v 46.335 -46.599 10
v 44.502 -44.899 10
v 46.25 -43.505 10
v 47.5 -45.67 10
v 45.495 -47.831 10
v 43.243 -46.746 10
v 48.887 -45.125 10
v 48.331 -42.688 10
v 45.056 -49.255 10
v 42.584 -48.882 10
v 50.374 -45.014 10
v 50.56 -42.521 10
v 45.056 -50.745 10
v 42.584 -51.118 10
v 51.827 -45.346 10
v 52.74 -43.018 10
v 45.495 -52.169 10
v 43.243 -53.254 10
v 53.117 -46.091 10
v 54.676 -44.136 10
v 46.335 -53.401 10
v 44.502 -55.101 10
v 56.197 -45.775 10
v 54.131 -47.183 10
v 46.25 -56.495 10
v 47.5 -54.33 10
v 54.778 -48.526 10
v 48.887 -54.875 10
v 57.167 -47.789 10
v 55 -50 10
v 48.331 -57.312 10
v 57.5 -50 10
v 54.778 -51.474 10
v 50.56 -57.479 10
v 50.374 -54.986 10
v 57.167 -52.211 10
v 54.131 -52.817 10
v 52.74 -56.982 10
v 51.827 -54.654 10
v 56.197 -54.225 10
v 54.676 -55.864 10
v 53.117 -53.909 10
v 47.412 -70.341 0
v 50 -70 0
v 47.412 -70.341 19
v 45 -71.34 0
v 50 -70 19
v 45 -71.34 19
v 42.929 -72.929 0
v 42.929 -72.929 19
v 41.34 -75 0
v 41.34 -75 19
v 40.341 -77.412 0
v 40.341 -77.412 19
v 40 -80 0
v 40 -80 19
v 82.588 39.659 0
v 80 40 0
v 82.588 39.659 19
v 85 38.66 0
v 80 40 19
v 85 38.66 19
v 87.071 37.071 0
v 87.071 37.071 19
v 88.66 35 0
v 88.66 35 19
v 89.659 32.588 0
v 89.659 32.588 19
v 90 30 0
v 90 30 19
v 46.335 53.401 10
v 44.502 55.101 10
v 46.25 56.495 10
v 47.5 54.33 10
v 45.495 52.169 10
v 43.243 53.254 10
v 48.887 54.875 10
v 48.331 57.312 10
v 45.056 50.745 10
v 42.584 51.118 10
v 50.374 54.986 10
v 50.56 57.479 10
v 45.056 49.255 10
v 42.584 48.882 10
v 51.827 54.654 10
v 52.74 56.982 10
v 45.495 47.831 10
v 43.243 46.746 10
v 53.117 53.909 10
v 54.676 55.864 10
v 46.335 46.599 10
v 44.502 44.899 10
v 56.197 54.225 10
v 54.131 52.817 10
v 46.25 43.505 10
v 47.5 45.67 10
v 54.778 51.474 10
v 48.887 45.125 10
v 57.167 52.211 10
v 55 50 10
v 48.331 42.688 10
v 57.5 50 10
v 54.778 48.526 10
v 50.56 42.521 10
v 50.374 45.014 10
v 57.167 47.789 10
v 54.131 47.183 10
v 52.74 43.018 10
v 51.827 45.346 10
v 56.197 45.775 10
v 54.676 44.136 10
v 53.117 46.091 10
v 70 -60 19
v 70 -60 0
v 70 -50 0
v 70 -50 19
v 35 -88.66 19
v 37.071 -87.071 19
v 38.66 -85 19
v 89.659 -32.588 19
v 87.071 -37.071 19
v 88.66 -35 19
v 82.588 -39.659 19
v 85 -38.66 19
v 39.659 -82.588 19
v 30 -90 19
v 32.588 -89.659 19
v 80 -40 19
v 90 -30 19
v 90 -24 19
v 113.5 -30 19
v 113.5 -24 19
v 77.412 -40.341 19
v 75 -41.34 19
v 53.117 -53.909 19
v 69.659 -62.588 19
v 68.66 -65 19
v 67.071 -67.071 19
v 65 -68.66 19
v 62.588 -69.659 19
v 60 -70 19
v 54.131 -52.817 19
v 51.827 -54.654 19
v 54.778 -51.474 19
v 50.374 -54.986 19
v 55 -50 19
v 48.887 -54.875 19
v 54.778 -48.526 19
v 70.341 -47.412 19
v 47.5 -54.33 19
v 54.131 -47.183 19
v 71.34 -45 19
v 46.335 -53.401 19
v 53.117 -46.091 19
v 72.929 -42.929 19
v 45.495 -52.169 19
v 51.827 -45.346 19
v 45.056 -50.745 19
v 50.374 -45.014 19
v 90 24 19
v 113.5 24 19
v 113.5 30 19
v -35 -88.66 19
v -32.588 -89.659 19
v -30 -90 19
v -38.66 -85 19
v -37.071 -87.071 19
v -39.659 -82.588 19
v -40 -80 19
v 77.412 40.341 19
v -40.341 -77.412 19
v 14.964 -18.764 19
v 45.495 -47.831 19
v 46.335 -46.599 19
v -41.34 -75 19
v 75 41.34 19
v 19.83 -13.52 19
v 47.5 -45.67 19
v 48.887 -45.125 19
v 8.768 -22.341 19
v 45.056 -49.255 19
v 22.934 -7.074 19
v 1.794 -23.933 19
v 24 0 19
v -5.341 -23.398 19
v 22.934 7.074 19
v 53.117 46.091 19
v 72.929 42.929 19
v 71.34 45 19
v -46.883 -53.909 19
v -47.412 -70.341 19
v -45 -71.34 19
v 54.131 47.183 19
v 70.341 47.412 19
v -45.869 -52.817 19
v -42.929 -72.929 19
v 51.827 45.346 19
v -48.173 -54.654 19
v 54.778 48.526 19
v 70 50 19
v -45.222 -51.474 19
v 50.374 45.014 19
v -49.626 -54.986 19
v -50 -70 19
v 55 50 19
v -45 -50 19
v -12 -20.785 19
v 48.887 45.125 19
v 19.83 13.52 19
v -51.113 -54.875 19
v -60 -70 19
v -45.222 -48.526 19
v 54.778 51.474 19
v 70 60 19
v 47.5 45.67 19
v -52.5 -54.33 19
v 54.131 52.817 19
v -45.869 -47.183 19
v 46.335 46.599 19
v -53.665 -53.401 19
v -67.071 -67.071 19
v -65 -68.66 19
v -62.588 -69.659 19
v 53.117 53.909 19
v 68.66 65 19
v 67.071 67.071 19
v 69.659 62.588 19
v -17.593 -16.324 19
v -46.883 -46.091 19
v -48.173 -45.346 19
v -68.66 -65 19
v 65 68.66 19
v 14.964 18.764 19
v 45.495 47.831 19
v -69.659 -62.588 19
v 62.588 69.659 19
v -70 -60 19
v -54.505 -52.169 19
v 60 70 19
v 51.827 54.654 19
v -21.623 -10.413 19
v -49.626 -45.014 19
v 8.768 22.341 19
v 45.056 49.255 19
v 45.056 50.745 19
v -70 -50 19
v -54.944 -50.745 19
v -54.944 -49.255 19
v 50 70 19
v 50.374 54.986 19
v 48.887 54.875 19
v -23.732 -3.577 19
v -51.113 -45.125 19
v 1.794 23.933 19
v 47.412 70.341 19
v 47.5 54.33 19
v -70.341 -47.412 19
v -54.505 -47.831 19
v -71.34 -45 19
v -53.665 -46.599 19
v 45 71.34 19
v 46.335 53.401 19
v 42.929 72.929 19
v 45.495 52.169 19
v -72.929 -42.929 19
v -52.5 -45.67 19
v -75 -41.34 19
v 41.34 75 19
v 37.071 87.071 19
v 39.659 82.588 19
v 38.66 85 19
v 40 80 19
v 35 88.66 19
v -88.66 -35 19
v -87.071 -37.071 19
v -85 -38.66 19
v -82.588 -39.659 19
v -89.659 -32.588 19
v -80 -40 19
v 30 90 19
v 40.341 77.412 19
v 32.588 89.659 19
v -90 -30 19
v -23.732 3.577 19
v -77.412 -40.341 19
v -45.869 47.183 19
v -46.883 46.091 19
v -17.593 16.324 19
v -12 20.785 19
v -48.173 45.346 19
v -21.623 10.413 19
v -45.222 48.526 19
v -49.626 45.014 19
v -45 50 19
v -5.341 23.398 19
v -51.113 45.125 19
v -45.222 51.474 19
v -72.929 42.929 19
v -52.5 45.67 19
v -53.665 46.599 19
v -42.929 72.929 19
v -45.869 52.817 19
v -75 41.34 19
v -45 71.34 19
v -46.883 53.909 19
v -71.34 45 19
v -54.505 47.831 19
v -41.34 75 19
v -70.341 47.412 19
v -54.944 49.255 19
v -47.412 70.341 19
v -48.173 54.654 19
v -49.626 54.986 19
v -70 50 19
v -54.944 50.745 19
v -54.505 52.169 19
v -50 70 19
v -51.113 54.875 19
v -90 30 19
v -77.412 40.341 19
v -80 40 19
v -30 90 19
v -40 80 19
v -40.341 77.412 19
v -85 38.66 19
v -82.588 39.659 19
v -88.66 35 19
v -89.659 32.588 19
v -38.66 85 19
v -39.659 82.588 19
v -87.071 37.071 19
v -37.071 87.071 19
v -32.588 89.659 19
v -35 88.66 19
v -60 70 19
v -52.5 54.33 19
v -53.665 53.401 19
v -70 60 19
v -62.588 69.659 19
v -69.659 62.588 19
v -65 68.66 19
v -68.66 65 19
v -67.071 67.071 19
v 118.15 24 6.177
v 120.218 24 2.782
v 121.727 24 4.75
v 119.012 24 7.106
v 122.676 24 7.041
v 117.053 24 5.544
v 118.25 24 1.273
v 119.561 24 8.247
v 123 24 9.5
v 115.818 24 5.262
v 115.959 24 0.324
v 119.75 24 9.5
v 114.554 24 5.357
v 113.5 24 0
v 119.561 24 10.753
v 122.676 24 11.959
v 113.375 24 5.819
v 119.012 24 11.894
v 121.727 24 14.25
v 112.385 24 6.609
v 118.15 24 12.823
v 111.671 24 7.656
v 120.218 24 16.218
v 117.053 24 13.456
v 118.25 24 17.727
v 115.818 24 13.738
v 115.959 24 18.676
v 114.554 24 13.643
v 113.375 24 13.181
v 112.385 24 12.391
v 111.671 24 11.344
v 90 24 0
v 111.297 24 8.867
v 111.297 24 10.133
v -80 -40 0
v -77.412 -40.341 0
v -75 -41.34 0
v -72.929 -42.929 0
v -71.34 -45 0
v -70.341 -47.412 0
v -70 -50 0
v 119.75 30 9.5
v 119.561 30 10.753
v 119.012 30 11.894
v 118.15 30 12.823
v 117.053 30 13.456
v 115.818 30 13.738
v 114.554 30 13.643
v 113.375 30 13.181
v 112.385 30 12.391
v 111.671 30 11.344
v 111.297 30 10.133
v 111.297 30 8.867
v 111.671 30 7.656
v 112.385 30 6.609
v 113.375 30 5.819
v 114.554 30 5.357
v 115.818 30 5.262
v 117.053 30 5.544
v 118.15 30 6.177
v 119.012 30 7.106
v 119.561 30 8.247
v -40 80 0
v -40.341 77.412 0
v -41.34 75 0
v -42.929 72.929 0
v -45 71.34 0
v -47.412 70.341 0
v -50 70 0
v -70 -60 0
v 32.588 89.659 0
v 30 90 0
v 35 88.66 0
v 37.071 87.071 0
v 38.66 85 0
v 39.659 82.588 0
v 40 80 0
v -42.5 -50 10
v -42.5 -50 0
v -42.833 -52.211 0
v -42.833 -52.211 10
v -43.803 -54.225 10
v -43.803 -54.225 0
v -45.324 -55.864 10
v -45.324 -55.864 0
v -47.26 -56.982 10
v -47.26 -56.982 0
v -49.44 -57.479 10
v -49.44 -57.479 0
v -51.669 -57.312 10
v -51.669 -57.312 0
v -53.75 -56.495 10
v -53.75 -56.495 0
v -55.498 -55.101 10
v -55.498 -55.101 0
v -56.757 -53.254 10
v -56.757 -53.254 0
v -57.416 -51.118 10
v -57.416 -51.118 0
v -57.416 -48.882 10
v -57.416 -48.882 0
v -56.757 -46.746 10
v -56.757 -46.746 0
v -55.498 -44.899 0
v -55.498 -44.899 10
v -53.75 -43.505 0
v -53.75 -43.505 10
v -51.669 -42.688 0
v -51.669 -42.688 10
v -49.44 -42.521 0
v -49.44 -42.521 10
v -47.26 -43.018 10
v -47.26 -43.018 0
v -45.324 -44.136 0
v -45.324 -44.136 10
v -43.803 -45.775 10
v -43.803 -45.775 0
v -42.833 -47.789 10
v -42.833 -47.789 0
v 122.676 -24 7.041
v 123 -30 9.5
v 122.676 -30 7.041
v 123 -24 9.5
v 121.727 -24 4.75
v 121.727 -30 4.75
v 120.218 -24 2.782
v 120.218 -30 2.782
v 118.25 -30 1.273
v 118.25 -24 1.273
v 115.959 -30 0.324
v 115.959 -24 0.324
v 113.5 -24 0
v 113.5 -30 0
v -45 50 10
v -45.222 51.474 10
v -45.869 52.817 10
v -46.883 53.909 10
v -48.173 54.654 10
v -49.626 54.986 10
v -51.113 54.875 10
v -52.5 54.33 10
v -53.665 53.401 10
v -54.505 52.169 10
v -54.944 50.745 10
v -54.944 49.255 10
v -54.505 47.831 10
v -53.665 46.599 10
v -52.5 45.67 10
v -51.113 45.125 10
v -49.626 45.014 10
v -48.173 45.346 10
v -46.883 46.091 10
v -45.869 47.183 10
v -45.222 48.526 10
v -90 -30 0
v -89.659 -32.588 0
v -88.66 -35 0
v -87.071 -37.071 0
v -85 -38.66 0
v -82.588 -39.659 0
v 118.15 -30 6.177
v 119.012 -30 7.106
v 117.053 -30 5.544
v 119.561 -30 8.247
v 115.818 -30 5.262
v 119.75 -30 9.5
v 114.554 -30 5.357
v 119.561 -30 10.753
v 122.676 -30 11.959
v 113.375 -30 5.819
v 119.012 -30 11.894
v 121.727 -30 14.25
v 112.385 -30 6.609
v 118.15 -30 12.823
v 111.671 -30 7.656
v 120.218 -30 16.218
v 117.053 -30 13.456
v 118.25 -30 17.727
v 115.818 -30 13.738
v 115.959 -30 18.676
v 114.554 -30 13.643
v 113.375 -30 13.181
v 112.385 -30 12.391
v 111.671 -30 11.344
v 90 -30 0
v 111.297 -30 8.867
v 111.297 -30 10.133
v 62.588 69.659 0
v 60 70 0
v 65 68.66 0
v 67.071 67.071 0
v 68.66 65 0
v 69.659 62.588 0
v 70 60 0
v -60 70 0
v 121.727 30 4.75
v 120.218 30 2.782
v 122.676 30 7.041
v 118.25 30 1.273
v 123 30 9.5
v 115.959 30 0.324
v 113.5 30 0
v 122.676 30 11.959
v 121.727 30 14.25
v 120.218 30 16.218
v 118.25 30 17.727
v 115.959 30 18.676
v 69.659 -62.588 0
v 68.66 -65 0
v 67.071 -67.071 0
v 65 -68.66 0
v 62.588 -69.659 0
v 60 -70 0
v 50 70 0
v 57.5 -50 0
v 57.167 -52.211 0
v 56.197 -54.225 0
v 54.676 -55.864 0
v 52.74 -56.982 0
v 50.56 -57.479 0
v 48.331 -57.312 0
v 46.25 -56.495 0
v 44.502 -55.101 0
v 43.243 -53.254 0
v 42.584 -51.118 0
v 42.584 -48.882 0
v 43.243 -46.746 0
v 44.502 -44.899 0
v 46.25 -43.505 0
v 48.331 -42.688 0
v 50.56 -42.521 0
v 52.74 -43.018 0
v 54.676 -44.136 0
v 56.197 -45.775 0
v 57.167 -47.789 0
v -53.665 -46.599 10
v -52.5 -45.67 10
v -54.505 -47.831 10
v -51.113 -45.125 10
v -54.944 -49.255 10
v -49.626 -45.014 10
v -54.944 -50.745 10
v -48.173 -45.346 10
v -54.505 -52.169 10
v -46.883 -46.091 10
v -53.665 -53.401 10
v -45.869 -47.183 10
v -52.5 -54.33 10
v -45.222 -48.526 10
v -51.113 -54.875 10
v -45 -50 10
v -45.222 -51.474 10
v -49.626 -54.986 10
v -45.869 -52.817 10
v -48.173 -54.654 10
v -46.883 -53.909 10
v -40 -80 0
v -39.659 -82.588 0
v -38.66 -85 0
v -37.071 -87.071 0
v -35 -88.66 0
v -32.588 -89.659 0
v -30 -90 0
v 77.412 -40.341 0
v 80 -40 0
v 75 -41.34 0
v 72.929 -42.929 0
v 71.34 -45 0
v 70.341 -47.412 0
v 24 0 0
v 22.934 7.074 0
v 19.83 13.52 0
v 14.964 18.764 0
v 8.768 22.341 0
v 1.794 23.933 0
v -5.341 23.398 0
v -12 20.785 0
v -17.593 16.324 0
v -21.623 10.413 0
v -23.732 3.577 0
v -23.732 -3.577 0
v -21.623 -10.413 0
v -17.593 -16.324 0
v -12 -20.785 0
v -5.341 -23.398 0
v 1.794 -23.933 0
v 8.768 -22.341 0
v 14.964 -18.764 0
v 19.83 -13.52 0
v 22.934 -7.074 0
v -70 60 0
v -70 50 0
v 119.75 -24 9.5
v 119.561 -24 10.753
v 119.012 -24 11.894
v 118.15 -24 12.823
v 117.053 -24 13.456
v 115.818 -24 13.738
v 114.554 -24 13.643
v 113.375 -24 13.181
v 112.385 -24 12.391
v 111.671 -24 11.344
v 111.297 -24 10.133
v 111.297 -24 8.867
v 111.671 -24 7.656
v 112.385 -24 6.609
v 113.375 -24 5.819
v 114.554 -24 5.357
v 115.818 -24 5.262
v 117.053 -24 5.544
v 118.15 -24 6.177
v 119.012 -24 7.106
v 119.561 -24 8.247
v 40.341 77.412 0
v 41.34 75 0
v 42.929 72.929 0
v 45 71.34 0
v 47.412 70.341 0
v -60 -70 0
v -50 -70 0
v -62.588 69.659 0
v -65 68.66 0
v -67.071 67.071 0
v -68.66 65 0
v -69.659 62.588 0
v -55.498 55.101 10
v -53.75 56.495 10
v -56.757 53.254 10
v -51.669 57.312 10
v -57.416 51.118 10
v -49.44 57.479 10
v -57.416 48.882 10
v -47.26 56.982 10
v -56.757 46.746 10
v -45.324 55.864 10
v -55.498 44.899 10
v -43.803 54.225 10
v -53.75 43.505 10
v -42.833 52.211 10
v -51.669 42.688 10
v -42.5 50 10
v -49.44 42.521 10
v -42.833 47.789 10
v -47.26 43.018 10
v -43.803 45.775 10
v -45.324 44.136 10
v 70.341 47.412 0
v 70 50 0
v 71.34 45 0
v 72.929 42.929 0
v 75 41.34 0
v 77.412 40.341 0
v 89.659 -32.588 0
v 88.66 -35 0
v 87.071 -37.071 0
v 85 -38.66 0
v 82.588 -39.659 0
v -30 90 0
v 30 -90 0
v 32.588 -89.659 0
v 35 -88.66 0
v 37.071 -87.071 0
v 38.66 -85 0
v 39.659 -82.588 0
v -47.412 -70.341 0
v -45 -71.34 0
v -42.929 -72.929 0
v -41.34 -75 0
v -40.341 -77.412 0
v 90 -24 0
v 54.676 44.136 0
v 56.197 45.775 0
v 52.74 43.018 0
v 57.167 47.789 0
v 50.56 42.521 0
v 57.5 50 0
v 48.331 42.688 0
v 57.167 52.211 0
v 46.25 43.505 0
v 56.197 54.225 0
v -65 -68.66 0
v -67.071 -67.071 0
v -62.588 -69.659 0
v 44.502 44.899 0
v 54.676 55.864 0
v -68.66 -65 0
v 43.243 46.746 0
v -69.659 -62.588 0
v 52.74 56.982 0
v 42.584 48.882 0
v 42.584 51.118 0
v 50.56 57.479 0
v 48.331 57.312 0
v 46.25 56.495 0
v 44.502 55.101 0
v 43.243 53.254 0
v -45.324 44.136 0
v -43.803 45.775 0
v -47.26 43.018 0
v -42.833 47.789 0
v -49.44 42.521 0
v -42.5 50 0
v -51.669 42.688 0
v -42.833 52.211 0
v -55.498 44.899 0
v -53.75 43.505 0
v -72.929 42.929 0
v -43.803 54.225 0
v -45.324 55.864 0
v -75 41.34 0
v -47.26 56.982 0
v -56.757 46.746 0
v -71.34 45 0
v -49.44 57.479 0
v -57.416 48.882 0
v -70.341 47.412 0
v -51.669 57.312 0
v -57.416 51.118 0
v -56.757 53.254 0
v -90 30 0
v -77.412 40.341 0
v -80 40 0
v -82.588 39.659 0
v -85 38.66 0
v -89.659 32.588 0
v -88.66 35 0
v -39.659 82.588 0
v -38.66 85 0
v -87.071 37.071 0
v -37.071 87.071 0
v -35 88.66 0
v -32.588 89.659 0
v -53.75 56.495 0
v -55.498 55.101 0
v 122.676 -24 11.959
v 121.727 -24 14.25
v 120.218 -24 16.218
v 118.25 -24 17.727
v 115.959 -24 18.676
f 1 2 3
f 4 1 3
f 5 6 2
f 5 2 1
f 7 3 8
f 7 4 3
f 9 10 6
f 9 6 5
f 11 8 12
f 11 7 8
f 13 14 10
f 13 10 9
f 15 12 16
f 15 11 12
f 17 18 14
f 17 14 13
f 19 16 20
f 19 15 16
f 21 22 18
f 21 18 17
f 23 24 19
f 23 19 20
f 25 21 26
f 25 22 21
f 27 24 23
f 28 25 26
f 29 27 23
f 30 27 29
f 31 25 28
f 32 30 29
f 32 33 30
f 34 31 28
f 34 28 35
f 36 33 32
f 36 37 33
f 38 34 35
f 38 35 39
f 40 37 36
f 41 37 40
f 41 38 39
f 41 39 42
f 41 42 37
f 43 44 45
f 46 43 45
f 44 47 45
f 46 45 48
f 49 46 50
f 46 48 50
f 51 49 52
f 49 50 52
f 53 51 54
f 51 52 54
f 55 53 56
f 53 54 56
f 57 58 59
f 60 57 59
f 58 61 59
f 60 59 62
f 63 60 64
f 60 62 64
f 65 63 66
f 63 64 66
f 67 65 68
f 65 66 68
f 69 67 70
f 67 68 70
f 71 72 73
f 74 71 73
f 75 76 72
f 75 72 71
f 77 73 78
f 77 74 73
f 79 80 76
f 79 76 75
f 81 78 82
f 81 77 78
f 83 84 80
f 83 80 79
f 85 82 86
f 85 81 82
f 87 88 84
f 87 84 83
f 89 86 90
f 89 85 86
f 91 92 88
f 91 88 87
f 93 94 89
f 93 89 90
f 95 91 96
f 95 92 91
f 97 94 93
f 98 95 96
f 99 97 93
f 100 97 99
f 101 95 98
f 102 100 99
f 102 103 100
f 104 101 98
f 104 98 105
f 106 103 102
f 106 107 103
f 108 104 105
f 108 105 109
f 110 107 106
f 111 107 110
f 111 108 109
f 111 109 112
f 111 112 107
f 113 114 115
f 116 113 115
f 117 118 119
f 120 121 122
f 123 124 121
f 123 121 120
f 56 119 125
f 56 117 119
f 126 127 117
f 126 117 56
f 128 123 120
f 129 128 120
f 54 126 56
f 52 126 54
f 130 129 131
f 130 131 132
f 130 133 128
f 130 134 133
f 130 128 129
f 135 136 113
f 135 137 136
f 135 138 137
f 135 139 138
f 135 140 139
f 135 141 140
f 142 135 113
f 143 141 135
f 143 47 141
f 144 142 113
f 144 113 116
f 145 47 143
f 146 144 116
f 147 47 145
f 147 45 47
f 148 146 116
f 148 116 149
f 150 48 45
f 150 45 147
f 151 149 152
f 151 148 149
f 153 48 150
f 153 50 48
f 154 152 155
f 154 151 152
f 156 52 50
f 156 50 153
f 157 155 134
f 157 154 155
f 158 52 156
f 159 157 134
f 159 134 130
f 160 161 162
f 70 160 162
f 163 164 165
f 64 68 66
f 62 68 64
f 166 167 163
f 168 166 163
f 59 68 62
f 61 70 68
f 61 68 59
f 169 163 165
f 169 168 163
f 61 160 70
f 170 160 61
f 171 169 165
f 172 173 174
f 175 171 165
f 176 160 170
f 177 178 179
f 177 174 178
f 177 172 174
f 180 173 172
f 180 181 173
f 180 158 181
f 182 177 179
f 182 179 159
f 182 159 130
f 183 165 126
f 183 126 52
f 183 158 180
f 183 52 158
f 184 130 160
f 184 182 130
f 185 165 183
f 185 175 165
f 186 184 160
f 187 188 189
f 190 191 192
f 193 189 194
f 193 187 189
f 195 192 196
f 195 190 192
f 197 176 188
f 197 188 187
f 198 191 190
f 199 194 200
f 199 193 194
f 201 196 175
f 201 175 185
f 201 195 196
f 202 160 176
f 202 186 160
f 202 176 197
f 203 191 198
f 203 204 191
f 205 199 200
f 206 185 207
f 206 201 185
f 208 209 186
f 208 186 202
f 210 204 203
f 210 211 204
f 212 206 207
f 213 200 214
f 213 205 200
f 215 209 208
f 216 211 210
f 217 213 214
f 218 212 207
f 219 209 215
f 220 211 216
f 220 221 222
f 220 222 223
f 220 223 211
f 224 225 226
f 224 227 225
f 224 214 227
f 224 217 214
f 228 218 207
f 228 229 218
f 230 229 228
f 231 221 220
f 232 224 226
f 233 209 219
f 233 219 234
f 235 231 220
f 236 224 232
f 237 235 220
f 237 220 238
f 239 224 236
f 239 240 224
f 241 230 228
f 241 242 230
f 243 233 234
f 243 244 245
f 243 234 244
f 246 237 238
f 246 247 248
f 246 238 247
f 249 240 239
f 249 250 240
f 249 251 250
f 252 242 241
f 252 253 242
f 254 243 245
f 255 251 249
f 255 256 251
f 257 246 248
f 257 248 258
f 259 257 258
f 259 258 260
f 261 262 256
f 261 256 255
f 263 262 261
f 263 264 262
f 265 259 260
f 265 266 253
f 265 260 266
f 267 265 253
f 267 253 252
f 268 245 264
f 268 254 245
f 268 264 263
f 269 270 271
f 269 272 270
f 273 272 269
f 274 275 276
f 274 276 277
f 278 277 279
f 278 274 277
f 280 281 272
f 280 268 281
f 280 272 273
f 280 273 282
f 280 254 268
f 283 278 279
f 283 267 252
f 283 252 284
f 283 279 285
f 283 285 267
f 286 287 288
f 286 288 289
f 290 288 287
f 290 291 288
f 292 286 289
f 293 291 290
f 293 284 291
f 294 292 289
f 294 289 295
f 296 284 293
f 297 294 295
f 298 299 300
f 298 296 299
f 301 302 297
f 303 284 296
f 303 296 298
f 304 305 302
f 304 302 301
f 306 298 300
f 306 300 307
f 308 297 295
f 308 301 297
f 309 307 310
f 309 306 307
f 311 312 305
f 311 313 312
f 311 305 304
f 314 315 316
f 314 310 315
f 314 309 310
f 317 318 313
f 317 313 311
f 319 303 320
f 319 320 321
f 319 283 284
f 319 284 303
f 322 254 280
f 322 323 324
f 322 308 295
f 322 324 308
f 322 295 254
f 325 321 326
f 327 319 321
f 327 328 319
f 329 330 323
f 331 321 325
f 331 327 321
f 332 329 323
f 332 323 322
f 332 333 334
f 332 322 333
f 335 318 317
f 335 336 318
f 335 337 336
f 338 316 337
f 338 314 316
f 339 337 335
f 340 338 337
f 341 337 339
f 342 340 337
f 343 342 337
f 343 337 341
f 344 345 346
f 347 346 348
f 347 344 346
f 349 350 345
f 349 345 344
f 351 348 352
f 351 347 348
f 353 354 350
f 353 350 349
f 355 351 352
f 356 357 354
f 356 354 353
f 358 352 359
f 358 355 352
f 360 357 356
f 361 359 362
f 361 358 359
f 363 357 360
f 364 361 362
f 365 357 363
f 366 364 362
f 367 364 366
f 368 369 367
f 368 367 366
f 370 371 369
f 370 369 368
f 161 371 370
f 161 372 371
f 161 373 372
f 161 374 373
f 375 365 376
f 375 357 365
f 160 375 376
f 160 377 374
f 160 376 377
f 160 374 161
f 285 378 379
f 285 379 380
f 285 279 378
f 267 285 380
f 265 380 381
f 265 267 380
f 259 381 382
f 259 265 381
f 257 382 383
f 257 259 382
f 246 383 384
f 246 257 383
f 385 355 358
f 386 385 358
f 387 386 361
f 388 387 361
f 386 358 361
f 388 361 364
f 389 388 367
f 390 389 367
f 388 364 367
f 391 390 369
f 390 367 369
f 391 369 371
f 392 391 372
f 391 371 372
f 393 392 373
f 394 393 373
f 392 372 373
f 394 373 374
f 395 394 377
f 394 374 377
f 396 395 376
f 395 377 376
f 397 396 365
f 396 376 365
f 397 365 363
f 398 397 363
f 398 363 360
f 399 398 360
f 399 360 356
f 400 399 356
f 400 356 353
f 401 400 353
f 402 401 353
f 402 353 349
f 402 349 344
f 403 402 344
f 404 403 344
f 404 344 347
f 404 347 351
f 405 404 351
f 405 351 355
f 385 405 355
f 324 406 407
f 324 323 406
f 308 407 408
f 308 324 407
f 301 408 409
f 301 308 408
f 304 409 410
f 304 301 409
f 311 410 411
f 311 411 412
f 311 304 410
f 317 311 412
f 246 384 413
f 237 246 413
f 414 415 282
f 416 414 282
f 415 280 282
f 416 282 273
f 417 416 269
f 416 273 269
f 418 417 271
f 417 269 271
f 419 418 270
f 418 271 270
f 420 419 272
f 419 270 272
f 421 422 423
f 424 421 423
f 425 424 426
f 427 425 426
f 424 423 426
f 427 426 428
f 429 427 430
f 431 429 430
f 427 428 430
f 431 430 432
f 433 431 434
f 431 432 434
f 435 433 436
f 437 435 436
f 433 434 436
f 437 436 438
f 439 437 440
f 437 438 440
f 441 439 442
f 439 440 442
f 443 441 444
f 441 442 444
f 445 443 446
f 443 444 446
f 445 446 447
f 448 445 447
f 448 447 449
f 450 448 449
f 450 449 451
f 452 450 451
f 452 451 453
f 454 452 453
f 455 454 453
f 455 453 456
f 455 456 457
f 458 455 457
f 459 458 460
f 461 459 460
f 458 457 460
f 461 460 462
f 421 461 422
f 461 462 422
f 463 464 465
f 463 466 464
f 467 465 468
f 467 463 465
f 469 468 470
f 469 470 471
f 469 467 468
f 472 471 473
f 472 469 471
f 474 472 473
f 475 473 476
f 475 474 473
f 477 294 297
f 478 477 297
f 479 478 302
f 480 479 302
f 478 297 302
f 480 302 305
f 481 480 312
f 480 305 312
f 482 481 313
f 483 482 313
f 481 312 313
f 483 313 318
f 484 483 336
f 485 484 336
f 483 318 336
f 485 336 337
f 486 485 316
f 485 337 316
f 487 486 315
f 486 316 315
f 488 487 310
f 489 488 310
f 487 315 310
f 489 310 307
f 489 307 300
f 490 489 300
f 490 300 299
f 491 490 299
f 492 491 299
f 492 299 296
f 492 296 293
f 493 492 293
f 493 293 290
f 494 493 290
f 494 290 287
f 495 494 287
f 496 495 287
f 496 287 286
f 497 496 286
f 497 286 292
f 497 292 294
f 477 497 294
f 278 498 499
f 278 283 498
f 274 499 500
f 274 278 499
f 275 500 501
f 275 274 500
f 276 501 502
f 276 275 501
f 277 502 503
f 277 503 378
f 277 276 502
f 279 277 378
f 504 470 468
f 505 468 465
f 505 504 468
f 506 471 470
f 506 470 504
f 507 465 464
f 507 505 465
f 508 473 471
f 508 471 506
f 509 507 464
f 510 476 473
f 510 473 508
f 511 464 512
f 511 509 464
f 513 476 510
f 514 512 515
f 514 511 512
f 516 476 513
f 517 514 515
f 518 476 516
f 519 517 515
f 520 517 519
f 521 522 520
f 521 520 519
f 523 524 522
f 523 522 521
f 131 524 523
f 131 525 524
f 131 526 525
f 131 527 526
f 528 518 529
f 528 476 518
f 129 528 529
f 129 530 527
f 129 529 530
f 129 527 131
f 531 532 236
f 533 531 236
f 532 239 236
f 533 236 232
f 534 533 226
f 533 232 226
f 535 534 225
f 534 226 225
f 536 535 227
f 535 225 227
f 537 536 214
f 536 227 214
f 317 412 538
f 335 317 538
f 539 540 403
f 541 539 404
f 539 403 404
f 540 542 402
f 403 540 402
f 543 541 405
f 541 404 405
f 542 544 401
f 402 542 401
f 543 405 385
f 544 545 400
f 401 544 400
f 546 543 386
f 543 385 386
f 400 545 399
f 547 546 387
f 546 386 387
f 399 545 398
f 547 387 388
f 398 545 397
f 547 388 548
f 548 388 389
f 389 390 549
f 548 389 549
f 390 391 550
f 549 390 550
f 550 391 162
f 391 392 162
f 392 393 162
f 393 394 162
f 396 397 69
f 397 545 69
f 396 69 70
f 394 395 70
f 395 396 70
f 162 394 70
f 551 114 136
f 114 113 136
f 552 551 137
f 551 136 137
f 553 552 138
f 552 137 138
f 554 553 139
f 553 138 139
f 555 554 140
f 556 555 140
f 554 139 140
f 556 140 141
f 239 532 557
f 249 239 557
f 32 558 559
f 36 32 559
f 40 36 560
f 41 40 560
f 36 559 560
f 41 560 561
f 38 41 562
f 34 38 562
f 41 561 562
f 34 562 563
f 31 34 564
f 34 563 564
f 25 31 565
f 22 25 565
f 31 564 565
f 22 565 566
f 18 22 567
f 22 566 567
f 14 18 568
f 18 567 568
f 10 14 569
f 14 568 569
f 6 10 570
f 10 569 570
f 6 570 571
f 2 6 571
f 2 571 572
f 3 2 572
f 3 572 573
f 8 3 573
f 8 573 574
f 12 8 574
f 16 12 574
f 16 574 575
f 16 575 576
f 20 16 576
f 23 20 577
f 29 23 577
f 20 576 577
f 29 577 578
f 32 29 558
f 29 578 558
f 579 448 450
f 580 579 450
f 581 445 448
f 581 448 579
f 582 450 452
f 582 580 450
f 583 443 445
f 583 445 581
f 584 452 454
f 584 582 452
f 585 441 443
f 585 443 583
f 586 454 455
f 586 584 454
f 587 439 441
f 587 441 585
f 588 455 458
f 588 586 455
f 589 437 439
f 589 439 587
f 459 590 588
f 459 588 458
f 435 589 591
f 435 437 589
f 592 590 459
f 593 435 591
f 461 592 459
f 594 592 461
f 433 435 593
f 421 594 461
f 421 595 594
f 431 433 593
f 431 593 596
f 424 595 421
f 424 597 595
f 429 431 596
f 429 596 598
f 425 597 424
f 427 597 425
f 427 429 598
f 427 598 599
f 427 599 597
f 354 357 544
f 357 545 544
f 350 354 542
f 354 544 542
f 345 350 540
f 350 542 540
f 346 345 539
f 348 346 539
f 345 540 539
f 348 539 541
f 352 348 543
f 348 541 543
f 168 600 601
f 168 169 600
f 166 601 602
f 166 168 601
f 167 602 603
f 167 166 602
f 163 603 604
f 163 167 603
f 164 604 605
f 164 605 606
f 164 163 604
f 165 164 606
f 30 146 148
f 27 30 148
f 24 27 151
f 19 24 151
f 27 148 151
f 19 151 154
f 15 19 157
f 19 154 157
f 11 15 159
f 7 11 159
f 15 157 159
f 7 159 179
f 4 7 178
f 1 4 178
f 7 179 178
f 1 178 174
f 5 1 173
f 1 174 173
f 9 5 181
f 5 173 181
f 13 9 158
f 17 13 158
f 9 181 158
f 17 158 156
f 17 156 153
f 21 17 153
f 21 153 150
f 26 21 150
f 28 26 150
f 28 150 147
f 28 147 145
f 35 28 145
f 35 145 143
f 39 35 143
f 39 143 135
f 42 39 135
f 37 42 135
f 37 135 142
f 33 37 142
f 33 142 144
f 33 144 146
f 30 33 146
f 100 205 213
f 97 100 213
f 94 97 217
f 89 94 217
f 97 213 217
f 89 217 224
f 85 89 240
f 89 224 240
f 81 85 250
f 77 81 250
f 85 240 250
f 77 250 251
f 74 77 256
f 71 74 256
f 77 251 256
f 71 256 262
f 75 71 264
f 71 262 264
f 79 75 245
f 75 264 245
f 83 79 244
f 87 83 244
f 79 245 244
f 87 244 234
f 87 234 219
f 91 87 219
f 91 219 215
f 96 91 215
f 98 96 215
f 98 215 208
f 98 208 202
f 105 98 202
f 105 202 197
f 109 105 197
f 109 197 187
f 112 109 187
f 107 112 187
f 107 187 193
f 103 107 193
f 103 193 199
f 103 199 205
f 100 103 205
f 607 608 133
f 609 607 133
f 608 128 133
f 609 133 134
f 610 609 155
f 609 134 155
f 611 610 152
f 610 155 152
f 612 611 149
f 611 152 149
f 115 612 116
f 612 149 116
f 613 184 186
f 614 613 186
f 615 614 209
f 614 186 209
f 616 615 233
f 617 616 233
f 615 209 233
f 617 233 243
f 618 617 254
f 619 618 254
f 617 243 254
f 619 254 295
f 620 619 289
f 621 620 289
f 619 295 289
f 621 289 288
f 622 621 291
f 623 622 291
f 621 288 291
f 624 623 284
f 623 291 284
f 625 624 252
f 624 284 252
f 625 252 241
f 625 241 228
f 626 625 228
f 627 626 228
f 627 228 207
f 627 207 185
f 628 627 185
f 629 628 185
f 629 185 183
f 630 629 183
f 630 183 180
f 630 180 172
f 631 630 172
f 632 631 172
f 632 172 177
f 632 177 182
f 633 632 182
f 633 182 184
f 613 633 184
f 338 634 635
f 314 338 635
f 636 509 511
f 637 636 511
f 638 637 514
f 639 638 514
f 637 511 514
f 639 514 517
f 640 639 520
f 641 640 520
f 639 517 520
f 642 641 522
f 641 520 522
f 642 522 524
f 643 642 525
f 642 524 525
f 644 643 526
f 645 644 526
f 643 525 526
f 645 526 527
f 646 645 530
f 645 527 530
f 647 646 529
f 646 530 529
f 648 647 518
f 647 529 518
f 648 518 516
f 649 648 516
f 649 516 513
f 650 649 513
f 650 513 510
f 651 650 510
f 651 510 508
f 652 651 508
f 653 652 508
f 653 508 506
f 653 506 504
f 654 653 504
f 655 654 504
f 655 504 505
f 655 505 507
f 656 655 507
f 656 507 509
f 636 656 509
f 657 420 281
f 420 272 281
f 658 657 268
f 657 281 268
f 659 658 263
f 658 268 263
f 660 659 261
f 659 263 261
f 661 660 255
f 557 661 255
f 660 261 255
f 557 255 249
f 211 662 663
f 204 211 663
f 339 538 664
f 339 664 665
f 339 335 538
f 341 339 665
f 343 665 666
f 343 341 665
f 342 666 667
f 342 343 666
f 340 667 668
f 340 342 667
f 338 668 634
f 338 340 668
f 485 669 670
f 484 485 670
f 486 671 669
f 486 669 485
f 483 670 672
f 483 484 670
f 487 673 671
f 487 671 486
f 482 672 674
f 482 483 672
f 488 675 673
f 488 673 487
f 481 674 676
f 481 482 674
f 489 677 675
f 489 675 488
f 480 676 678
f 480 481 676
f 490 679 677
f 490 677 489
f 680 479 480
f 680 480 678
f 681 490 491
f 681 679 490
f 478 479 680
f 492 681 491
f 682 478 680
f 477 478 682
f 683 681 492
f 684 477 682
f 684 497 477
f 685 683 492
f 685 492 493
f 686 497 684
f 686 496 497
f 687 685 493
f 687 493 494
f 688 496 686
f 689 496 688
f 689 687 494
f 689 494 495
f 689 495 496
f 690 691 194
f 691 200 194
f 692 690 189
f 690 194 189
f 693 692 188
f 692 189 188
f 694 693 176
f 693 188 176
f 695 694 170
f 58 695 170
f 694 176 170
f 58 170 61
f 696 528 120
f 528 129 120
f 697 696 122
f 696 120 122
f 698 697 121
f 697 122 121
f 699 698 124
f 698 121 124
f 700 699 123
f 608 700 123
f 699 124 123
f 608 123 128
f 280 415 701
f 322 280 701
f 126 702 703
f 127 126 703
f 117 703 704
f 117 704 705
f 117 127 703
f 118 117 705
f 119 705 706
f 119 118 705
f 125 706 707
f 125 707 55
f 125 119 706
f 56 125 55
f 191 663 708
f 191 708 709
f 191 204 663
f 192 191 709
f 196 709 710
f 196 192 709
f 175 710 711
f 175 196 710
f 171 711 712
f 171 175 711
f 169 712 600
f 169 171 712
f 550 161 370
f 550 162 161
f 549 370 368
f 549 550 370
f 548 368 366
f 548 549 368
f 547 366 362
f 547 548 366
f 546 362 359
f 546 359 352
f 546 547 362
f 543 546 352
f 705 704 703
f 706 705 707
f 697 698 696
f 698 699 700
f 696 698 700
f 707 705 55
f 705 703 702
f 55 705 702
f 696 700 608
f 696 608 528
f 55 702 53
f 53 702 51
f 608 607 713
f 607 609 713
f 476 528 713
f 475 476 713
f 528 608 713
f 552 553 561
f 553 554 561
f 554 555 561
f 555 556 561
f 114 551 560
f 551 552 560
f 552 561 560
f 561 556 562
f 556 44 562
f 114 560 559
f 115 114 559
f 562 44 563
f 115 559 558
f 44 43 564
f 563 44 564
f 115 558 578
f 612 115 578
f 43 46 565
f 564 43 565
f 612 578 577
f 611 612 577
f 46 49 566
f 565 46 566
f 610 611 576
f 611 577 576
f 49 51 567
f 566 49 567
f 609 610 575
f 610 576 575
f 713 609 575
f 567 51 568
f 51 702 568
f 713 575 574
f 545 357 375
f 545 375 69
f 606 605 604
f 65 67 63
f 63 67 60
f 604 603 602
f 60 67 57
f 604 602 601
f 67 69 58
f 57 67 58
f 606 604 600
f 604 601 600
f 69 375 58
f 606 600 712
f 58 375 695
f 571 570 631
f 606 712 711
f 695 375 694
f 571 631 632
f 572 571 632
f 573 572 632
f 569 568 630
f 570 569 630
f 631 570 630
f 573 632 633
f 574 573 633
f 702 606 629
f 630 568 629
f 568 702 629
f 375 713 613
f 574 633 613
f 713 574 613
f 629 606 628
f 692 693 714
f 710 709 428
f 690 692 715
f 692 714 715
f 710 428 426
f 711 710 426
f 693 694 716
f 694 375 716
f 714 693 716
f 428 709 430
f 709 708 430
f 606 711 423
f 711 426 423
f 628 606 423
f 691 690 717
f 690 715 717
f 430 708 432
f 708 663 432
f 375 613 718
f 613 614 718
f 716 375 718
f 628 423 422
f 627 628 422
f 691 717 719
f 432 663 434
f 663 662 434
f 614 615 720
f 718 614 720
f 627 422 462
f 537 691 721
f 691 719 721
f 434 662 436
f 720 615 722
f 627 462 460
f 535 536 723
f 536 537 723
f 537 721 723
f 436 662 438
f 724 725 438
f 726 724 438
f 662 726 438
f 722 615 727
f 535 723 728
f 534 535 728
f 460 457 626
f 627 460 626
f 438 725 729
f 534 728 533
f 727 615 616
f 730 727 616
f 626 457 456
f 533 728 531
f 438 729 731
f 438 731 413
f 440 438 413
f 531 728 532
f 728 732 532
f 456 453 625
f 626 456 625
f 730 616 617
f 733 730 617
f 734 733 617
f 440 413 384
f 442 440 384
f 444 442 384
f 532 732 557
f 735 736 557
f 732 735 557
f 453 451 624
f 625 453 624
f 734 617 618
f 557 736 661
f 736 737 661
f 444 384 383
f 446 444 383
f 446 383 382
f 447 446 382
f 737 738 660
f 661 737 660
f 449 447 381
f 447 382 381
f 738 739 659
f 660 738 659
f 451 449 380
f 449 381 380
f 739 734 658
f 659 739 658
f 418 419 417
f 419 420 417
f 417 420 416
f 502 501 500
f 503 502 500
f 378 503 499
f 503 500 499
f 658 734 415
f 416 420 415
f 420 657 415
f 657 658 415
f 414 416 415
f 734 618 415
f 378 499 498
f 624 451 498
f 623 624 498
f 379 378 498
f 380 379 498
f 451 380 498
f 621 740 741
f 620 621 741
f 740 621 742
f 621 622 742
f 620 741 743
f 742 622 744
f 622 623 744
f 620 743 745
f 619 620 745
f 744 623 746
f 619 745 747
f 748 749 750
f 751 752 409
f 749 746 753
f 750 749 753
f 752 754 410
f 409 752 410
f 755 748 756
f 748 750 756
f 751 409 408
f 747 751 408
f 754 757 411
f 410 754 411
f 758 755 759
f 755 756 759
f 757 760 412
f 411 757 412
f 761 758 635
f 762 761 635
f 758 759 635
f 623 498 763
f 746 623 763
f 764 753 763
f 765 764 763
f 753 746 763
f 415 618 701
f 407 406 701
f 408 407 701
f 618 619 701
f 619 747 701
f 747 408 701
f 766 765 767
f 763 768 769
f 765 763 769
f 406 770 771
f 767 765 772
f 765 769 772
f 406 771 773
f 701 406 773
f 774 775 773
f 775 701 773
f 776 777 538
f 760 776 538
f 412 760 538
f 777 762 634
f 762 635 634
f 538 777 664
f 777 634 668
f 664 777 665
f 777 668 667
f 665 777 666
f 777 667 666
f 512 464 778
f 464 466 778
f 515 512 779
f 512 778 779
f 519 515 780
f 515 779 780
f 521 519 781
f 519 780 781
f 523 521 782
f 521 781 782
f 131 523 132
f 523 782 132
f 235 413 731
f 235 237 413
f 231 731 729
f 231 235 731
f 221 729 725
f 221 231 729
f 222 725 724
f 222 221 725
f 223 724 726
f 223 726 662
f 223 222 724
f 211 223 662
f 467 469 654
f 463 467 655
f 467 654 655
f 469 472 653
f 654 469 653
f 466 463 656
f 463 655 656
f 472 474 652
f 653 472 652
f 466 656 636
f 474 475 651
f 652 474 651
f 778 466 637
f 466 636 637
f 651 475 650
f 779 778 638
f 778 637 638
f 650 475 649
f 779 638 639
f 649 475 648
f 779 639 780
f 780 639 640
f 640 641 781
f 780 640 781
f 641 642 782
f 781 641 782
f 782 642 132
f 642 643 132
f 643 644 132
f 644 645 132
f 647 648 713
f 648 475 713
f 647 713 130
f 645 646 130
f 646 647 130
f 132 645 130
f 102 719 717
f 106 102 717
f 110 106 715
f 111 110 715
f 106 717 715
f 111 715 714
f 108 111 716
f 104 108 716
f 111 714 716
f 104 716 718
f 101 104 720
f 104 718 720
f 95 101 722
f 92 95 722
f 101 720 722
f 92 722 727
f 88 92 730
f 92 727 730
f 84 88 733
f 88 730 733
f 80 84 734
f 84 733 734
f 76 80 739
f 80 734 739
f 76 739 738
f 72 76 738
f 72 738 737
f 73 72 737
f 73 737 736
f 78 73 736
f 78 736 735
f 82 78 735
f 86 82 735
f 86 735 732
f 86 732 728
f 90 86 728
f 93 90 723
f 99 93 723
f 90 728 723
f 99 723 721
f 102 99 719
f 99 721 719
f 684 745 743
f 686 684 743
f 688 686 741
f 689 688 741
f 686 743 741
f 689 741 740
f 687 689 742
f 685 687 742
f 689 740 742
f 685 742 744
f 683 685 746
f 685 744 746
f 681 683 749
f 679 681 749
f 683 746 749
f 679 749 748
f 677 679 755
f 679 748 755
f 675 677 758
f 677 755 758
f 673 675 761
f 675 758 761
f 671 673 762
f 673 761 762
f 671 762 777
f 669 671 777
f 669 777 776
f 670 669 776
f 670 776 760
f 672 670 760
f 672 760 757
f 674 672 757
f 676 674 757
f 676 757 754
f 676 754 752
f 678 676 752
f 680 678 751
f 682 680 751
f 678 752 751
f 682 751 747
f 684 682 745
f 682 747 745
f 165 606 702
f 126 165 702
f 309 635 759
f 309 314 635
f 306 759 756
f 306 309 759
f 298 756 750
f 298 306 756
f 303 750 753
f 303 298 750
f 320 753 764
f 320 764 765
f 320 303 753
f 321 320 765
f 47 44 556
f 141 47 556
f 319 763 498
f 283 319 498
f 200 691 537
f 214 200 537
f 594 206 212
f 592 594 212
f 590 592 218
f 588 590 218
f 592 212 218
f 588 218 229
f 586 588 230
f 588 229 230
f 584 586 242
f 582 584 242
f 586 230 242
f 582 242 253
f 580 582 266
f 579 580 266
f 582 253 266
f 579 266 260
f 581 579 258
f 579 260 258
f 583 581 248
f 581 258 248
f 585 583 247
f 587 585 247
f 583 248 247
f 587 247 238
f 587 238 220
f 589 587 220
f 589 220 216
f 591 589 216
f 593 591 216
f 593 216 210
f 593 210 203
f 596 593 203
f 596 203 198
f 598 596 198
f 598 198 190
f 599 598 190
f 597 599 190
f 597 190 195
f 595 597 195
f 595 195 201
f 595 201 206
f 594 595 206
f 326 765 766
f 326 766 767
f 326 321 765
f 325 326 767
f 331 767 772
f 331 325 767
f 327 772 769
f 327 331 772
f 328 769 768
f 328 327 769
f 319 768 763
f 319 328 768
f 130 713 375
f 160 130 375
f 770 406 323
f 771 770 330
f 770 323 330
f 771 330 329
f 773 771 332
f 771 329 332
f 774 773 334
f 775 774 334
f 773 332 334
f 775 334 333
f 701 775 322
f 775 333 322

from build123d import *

# Parameters (mm, degrees)
F1_DEPTH  = 19
F2_R      = 24
F3_DEPTH  = 25
F4_R      = 9.99999
F5_R      = 5
F6_DEPTH  = 25
F7_R      = 7.5
F8_DEPTH  = 10
F9_W      = 6
F9_H      = 19
F10_DEPTH = 25
F11_DEPTH = 25
F12_R     = 4.25
F13_DEPTH = 250
F15_DEPTH = 8
F16_R     = 4.25
F17_DEPTH = 250
F18_R     = 9.49999


# Not quite as in the source:
# - a fillet or chamfer is up to 0.001 mm smaller than in the source, because OpenCascade refuses the exact size


with BuildPart() as f1:
    # F0 (on Top) → F1 (new body)
    with BuildSketch(Plane.XY):
        Polygon((0, 90), (-40, 90), (-40, 70), (-70, 70), (-70, 40), (-90, 40), (-90, 0), (0, 0), align=None)
        Polygon((40, 90), (0, 90), (0, 0), (90, 0), (90, 40), (70, 40), (70, 70), (40, 70), align=None)
        Polygon((0, -90), (0, 0), (-90, 0), (-90, -40), (-70, -40), (-70, -70), (-40, -70), (-40, -90), align=None)
        Polygon((90, 0), (0, 0), (0, -90), (40, -90), (40, -70), (70, -70), (70, -40), (90, -40), align=None)
    extrude(amount=F1_DEPTH)

    # F2 (on face) → F3 (cut)
    with BuildSketch(Plane.XY.offset(19)):
        Circle(F2_R)
    extrude(amount=-F3_DEPTH, mode=Mode.SUBTRACT)

    # F4 (radius 10 in the source; OpenCascade refuses exactly that, so slightly less here)
    f4_edges = [f1.edges().sort_by_distance(p)[0] for p in [
        (-70, 40, 9.5),
        (-40, 70, 9.5),
        (-40, 90, 9.5),
        (-70, 70, 9.5),
        (-90, 40, 9.5),
        (-40, -90, 9.5),
        (-40, -70, 9.5),
        (-70, -70, 9.5),
        (-70, -40, 9.5),
        (-90, -40, 9.5),
        (40, -90, 9.5),
        (40, -70, 9.5),
        (70, -70, 9.5),
        (70, -40, 9.5),
        (90, -40, 9.5),
        (90, 40, 9.5),
        (70, 40, 9.5),
        (70, 70, 9.5),
        (40, 70, 9.5),
        (40, 90, 9.5),
    ]]
    fillet(f4_edges, radius=F4_R)

    # F5 (on face) → F6 (cut)
    with BuildSketch(Plane.XY.offset(19)):
        with Locations((-50, -50)):
            Circle(F5_R)
        with Locations((50, -50)):
            Circle(F5_R)
        with Locations((-50, 50)):
            Circle(F5_R)
        with Locations((50, 50)):
            Circle(F5_R)
    extrude(amount=-F6_DEPTH, mode=Mode.SUBTRACT)

    # F7 (on face) → F8 (cut)
    with BuildSketch(Plane(origin=(0, 0, 0), x_dir=(1, 0, 0), z_dir=(0, 0, -1))):
        with Locations((-50, 50)):
            Circle(F7_R)
        with Locations((50, 50)):
            Circle(F7_R)
        with Locations((-50, -50)):
            Circle(F7_R)
        with Locations((50, -50)):
            Circle(F7_R)
    extrude(amount=-F8_DEPTH, mode=Mode.SUBTRACT)

    # F9 (on face) → F10 (join)
    with BuildSketch(Plane.YZ.offset(90)):
        with Locations((-27, 9.5)):
            Rectangle(F9_W, F9_H)
        with Locations((27, 9.5)):
            Rectangle(F9_W, F9_H)
    extrude(amount=F10_DEPTH)

    # F9 (on face) → F11 (join)
    with BuildSketch(Plane.YZ.offset(90)):
        with Locations((-27, 9.5)):
            Rectangle(F9_W, F9_H)
        with Locations((27, 9.5)):
            Rectangle(F9_W, F9_H)
    extrude(amount=F11_DEPTH)

    # F12 (on face) → F13 (cut)
    with BuildSketch(Plane.XZ.offset(30)):
        with BuildLine():
            ThreePointArc((125, 0), (134.5, 9.5), (125, 19))
            Line((125, 19), (115, 19))
            Line((115, 19), (115, 0))
            Line((115, 0), (125, 0))
        make_face()
        with Locations((125, 9.5)):
            Circle(F12_R, mode=Mode.SUBTRACT)
        with Locations((125, 9.5)):
            Circle(F12_R)
    extrude(amount=-F13_DEPTH, mode=Mode.SUBTRACT)

    # F15 (add): faces of the model
    f15_faces = [f1.faces().sort_by_distance(p)[0] for p in [
        (115, -27, 9.5),
        (115, 27, 9.5),
    ]]
    extrude(f15_faces, amount=F15_DEPTH)

    # F16 (on face) → F17 (cut)
    with BuildSketch(Plane.XZ.offset(30)):
        with Locations((115.5, 9.5)):
            Circle(F16_R)
    extrude(amount=-F17_DEPTH, mode=Mode.SUBTRACT)

    # F18 (radius 9.5 in the source; OpenCascade refuses exactly that, so slightly less here)
    f18_edges = [f1.edges().sort_by_distance(p)[0] for p in [
        (123, 27, 0),
        (123, -27, 0),
        (123, -27, 19),
        (123, 27, 19),
    ]]
    fillet(f18_edges, radius=F18_R)


solid = f1.part
